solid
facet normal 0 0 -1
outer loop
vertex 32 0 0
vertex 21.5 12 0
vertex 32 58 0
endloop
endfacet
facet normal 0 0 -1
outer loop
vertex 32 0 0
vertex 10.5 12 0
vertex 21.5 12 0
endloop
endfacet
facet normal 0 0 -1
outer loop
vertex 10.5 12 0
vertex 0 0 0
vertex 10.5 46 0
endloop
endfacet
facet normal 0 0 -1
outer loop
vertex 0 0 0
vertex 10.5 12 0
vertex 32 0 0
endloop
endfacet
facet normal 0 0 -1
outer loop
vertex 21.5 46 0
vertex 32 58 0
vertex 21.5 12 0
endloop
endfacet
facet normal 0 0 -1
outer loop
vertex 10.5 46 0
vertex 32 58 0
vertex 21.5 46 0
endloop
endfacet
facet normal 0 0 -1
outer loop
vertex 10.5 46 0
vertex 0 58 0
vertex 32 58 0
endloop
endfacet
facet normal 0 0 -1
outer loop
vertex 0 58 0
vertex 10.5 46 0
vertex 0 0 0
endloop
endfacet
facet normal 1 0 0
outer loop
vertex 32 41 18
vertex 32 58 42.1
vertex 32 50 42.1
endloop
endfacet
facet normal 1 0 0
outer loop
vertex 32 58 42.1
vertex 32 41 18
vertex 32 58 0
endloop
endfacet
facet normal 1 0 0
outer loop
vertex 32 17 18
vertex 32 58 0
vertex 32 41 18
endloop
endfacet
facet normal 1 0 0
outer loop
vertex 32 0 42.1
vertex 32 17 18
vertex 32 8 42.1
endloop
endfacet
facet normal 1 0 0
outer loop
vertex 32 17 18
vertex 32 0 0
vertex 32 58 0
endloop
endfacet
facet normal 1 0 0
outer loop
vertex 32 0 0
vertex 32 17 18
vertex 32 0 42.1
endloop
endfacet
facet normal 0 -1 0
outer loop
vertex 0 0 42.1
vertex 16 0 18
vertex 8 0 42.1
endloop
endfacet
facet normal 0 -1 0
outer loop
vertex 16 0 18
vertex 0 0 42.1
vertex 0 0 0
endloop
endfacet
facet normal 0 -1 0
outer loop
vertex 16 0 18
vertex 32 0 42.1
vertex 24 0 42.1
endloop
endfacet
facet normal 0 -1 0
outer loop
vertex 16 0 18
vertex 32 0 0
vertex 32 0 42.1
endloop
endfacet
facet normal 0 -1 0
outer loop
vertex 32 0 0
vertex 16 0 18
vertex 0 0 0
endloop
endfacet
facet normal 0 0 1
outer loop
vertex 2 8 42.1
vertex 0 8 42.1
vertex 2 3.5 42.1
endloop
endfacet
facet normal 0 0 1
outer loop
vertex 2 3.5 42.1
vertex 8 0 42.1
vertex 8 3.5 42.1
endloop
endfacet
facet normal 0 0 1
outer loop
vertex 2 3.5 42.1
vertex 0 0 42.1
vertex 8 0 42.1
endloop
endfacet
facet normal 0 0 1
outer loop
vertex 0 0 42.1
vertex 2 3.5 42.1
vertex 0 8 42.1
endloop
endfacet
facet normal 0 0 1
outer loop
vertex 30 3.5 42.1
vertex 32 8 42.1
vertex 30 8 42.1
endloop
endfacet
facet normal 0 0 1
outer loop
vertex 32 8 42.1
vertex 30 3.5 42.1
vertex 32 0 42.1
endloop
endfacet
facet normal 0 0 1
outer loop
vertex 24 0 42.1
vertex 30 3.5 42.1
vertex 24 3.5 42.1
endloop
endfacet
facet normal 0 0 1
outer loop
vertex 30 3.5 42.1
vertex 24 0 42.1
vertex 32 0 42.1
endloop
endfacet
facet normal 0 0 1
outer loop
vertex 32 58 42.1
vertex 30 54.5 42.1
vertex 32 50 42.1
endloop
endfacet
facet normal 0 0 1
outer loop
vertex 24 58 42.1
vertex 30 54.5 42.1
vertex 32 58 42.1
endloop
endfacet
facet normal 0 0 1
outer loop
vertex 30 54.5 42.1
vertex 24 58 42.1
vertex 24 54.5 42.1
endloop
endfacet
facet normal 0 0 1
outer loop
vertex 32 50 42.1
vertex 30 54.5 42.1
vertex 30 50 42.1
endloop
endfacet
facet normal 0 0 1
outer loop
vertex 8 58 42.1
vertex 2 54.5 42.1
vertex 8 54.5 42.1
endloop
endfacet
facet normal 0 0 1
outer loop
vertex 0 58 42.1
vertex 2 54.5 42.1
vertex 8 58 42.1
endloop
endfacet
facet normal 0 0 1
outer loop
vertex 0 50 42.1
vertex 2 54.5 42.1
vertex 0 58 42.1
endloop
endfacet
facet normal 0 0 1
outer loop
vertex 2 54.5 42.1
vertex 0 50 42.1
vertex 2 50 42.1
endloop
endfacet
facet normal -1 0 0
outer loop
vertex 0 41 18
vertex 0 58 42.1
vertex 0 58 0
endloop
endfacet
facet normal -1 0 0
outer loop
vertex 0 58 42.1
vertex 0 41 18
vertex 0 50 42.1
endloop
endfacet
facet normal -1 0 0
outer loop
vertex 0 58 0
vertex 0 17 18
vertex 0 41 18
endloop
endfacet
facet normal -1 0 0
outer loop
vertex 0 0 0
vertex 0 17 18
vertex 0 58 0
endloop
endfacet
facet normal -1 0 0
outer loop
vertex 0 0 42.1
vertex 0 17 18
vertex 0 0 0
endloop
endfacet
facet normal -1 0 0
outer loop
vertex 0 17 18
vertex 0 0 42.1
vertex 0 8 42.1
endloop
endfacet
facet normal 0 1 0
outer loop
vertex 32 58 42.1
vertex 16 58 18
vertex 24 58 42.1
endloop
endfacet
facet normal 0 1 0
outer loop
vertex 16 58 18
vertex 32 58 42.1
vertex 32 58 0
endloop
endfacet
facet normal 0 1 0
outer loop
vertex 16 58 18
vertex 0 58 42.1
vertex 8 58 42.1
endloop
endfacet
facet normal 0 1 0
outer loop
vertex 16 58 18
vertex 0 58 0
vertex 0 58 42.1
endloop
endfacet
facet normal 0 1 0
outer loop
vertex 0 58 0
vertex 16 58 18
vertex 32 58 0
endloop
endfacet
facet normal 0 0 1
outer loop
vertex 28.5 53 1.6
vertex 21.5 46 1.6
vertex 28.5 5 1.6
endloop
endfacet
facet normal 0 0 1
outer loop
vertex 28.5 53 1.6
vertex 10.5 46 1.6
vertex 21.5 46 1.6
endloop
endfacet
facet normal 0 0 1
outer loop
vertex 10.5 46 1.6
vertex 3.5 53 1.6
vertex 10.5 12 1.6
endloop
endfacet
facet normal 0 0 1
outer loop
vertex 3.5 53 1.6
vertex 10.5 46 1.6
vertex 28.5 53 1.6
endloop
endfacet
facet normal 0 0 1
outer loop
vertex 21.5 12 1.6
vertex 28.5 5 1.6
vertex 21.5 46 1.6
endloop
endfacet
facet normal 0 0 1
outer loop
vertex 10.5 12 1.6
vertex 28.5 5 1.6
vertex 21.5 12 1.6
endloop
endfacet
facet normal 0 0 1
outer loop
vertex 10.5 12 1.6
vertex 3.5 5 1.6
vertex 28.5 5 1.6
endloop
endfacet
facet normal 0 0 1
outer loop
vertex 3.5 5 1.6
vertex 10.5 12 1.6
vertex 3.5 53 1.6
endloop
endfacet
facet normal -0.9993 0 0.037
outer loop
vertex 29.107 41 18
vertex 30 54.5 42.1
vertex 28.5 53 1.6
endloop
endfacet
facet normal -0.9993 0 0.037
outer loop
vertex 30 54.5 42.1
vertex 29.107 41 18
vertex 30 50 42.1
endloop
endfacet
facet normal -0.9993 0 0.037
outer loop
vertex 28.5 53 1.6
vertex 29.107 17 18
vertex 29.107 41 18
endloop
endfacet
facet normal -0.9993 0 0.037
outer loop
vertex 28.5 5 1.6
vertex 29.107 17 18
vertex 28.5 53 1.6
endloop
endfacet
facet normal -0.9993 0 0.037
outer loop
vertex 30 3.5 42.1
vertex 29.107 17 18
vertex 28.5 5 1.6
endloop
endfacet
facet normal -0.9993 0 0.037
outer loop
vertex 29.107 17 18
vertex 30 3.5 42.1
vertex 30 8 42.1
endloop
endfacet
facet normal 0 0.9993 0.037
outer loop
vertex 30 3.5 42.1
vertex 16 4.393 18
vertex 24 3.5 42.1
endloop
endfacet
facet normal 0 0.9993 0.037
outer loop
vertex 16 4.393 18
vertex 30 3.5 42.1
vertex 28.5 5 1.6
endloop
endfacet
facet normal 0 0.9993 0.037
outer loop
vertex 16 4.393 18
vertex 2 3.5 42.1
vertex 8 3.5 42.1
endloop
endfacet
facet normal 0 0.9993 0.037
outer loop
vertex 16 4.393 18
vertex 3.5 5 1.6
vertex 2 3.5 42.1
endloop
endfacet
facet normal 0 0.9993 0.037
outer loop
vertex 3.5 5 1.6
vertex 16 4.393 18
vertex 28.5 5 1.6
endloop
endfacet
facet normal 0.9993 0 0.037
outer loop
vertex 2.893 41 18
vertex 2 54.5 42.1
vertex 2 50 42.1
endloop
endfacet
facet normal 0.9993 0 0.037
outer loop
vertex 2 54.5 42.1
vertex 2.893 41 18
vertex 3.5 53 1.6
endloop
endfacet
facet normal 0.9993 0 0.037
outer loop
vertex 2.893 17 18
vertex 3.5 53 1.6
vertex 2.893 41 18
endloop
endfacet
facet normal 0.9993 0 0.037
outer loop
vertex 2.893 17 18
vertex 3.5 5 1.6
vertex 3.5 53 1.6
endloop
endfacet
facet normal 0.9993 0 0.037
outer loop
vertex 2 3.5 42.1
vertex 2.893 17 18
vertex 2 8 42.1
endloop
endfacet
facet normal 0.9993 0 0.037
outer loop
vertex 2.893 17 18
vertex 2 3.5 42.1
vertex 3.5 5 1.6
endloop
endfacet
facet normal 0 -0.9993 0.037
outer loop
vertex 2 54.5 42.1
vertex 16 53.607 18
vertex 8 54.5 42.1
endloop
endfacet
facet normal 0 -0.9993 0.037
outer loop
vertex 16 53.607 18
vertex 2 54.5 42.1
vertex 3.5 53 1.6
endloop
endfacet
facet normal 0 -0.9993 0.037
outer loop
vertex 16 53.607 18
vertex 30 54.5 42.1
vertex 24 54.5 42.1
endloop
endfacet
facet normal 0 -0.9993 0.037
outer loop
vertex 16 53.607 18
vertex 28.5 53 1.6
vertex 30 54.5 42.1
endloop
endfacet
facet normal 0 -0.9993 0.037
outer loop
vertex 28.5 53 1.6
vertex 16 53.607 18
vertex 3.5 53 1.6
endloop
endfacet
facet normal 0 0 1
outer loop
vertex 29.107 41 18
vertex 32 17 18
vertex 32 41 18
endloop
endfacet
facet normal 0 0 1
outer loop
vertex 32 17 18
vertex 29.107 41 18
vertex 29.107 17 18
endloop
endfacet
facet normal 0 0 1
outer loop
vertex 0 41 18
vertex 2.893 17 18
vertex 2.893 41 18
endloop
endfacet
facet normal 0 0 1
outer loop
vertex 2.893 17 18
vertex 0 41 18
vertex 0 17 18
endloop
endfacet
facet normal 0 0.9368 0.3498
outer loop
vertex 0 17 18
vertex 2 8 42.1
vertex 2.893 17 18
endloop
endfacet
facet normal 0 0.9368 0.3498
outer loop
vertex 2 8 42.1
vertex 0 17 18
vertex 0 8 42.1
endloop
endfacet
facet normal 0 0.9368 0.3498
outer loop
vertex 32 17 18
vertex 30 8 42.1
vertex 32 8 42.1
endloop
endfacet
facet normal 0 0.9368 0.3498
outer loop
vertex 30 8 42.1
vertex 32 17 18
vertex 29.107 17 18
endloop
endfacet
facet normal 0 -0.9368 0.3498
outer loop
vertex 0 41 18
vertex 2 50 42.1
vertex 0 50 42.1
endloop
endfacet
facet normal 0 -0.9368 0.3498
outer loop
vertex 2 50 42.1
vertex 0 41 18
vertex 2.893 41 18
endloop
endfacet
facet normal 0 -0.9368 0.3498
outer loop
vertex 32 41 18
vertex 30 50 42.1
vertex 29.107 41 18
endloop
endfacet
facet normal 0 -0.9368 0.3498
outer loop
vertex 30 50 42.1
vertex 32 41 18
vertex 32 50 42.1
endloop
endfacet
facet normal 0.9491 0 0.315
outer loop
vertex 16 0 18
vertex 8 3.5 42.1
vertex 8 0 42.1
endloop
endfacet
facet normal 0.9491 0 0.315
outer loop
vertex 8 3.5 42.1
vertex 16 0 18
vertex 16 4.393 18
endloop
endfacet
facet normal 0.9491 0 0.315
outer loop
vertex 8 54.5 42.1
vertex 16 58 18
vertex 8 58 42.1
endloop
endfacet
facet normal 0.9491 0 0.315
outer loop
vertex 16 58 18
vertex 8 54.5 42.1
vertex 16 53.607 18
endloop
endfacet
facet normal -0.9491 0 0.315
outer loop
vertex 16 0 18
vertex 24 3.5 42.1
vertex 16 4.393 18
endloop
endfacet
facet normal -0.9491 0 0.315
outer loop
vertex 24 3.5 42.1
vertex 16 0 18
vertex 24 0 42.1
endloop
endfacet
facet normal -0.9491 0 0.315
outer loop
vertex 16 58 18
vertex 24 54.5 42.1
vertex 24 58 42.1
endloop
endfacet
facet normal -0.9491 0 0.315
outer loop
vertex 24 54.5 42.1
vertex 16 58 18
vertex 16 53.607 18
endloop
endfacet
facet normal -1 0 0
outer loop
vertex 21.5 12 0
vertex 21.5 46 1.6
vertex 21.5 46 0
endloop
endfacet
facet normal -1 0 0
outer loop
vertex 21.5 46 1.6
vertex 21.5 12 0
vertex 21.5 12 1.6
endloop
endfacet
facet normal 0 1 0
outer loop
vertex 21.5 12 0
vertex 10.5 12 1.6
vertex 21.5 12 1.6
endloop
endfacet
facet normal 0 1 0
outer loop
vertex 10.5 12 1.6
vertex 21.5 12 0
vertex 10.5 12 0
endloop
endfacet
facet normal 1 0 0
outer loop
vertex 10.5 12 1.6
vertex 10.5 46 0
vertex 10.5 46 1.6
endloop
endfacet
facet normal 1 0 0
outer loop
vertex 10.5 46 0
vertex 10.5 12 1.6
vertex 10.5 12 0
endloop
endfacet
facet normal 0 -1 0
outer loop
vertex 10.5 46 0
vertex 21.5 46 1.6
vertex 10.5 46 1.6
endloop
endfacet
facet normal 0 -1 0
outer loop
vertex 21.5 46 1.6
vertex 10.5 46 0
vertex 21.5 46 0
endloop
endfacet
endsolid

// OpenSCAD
/*
Game Box Organizer
Created by: Craig Wood
Last Modified: Nov. 22, 2016
*/


// Round Bottom is based off width and always runs the length

CardBox (25,48,40.5,32,58,1.6,16,8,17,8,18,18,0);
/*translate([29,0,0]) 
	CardBox (25,48,40.5,32,58,1.6,16,8,17,8,18,18,0);

translate([58,0,0]) 
	CardBox (45,48,40.5,52,58,1.6,16,8,17,8,18,18,0);
/*
translate([85,0,0])
	CardBox (33,78,33.5,40,85,1.6,16,12,17,12,18,6,1);
translate([0,210,0])
	rotate([0,0,270])
		CardBox (33,78,33.5,40,85,1.6,16,12,17,12,18,6,0);

*/



/*

// Container 1 for Gilded Compass

CardBox (57,32,60,73,45,1.6,22,17,17,12,12,0,0);
translate([0,45,0])
	CardBox (65,55,60,73,68,1.6,22,17,22,17,12,0,0);
translate([0,113,0])
	CardBox (62,32,60,73,45,1.6,22,17,17,12,12,0,0);
translate([0,158,0])
	CardBox (57,32,60,73,45,1.6,22,17,17,12,12,0,0);

	*/


module CardBox (length,width,height,outer_length,outer_width,base,bottom_len_l,top_len_l,
				bottom_len_w,top_len_w,bottom_height_l,bottom_height_w,bottom_type) {

// bottom_type is 0 for hollowed, 1 for filled, 2 for round

	bottom_width_l = (outer_length-length )/ 2;
	top_width_l = bottom_width_l - 1.5;
	total_height = base+height;
	bottom_width = (outer_width-width) / 2;
	top_width = bottom_width - 1.5;


	echo ("Top Width L",top_width,top_width_l,bottom_width,bottom_width_l,outer_width,width);

	FullBoxPoints = [
	  [  0,  0,  0 ],  //0
	  [ outer_length,  0,  0 ],  //1
	  [ outer_length,  outer_width,  0 ],  //2
	  [  0,  outer_width,  0 ],  //3
	  [  0,  0,  total_height ],  //4
	  [ outer_length,  0,  total_height ],  //5
	  [ outer_length,  outer_width,  total_height ],  //6
	  [  0,  outer_width,  total_height ]]; //7


	HollowFullBox = [
	  [ bottom_width_l,  bottom_width,  base ],  //0
	  [ outer_length-bottom_width_l,  bottom_width,  base ],  //1
	  [ outer_length-bottom_width_l,  outer_width-bottom_width,  base ],  //2
	  [  bottom_width_l,  outer_width-bottom_width,  base ],  //3
	  [  top_width_l,  top_width,  total_height ],  //4
	  [ outer_length-top_width_l,  top_width,  total_height ],  //5
	  [ outer_length-top_width_l,  outer_width-top_width,  total_height ],  //6
	  [  top_width_l,  outer_width-top_width,  total_height ]]; //7
	  
	HollowRoundBox = [
	  [ bottom_width_l,  bottom_width,  base+(bottom_width/2) ],  //0
	  [ outer_length-bottom_width_l,  bottom_width,base+(bottom_width/2) ],  //1
	  [ outer_length-bottom_width_l,  outer_width-bottom_width,  base+(bottom_width/2)],  //2
	  [  bottom_width_l,  outer_width-bottom_width,  base+(bottom_width/2) ],  //3
	  [  top_width_l,  top_width,  total_height ],  //4
	  [ outer_length-top_width_l,  top_width,  total_height ],  //5
	  [ outer_length-top_width_l,  outer_width-top_width,  total_height ],  //6
	  [  top_width_l,  outer_width-top_width,  total_height ]]; //7

	HollowLength = [
	  [  0,  bottom_len_w,  bottom_height_l ],  //0
	  [ outer_length,  bottom_len_w,  bottom_height_l ],  //1
	  [ outer_length,  outer_width-bottom_len_w,  bottom_height_l ],  //2
	  [ 0,  outer_width-bottom_len_w,  bottom_height_l ],  //3
	  [  0,  top_len_w,  total_height ],  //4
	  [ outer_length , top_len_w,  total_height ],  //5
	  [ outer_length,  outer_width-top_len_w,  total_height ],  //6
	  [  0, outer_width-top_len_w,  total_height ]]; //7
  
	HollowWidth = [
	  [ bottom_len_l,  0,  bottom_height_w ],  //0
	  [ outer_length-bottom_len_l,  0,  bottom_height_w ],  //1
	  [ outer_length-bottom_len_l,  outer_width,  bottom_height_w ],  //2
	  [ bottom_len_l,  outer_width,  bottom_height_w ],  //3
	  [ top_len_l,  0,  total_height ],  //4
	  [ outer_length-top_len_l,  0,  total_height ],  //5
	  [ outer_length-top_len_l,  outer_width,  total_height ],  //6
	  [ top_len_l,  outer_width,  total_height ]]; //7

	HollowBottom = [
	  [ bottom_width_l+7,  bottom_width+7,  0 ],  //0
	  [ outer_length-bottom_width_l-7,  bottom_width+7,  0 ],  //1
	  [ outer_length-bottom_width_l-7,  outer_width-bottom_width-7,  0 ],  //2
	  [  bottom_width_l+7,  outer_width-bottom_width-7,  0 ],  //3
	  [  bottom_width_l+7,  bottom_width+7,  base ],  //4
	  [ outer_length-bottom_width_l-7,  bottom_width+7,  base ],  //5
	  [ outer_length-bottom_width_l-7,  outer_width-bottom_width-7,  base ],  //6
	  [  bottom_width_l+7,  outer_width-bottom_width-7,  base ]]; //7

	 FillBottom = [
	  [  bottom_width_l-2,  bottom_width-2,  0 ],  //0
	  [ outer_length-bottom_width_l+2,  bottom_width-2,  0 ],  //1
	  [ outer_length-bottom_width_l+2,  outer_width-bottom_width+2,  0 ],  //2
	  [  bottom_width_l-2,  outer_width-bottom_width+2,  0 ],  //3
	  [  bottom_width_l-2,  bottom_width-2,  base ],  //4
	  [ outer_length-bottom_width_l+2,  bottom_width-2,  base ],  //5
	  [ outer_length-bottom_width_l+2,  outer_width-bottom_width+2,  base ],  //6
	  [  bottom_width_l-2,  outer_width-bottom_width+2,  base ]]; //7

	  RoundBottom =[
	  ];

	CubeFaces = [ [0,1,2,3], [4,5,1,0],  [7,6,5,4],  [5,6,2,1],  [6,7,3,2],   [7,4,0,3]]; // left

	difference() {
		union () {
			difference () {
				polyhedron( FullBoxPoints, CubeFaces );
				if (bottom_type==2) {
					polyhedron( HollowRoundBox, CubeFaces );
				} else {
					polyhedron( HollowFullBox, CubeFaces );
				}
				polyhedron( HollowLength, CubeFaces );
				polyhedron( HollowWidth, CubeFaces );
			}
				polyhedron( FillBottom, CubeFaces);
			}
			if (bottom_type==0) {
				polyhedron( HollowBottom, CubeFaces );
			}
		}
	
}
